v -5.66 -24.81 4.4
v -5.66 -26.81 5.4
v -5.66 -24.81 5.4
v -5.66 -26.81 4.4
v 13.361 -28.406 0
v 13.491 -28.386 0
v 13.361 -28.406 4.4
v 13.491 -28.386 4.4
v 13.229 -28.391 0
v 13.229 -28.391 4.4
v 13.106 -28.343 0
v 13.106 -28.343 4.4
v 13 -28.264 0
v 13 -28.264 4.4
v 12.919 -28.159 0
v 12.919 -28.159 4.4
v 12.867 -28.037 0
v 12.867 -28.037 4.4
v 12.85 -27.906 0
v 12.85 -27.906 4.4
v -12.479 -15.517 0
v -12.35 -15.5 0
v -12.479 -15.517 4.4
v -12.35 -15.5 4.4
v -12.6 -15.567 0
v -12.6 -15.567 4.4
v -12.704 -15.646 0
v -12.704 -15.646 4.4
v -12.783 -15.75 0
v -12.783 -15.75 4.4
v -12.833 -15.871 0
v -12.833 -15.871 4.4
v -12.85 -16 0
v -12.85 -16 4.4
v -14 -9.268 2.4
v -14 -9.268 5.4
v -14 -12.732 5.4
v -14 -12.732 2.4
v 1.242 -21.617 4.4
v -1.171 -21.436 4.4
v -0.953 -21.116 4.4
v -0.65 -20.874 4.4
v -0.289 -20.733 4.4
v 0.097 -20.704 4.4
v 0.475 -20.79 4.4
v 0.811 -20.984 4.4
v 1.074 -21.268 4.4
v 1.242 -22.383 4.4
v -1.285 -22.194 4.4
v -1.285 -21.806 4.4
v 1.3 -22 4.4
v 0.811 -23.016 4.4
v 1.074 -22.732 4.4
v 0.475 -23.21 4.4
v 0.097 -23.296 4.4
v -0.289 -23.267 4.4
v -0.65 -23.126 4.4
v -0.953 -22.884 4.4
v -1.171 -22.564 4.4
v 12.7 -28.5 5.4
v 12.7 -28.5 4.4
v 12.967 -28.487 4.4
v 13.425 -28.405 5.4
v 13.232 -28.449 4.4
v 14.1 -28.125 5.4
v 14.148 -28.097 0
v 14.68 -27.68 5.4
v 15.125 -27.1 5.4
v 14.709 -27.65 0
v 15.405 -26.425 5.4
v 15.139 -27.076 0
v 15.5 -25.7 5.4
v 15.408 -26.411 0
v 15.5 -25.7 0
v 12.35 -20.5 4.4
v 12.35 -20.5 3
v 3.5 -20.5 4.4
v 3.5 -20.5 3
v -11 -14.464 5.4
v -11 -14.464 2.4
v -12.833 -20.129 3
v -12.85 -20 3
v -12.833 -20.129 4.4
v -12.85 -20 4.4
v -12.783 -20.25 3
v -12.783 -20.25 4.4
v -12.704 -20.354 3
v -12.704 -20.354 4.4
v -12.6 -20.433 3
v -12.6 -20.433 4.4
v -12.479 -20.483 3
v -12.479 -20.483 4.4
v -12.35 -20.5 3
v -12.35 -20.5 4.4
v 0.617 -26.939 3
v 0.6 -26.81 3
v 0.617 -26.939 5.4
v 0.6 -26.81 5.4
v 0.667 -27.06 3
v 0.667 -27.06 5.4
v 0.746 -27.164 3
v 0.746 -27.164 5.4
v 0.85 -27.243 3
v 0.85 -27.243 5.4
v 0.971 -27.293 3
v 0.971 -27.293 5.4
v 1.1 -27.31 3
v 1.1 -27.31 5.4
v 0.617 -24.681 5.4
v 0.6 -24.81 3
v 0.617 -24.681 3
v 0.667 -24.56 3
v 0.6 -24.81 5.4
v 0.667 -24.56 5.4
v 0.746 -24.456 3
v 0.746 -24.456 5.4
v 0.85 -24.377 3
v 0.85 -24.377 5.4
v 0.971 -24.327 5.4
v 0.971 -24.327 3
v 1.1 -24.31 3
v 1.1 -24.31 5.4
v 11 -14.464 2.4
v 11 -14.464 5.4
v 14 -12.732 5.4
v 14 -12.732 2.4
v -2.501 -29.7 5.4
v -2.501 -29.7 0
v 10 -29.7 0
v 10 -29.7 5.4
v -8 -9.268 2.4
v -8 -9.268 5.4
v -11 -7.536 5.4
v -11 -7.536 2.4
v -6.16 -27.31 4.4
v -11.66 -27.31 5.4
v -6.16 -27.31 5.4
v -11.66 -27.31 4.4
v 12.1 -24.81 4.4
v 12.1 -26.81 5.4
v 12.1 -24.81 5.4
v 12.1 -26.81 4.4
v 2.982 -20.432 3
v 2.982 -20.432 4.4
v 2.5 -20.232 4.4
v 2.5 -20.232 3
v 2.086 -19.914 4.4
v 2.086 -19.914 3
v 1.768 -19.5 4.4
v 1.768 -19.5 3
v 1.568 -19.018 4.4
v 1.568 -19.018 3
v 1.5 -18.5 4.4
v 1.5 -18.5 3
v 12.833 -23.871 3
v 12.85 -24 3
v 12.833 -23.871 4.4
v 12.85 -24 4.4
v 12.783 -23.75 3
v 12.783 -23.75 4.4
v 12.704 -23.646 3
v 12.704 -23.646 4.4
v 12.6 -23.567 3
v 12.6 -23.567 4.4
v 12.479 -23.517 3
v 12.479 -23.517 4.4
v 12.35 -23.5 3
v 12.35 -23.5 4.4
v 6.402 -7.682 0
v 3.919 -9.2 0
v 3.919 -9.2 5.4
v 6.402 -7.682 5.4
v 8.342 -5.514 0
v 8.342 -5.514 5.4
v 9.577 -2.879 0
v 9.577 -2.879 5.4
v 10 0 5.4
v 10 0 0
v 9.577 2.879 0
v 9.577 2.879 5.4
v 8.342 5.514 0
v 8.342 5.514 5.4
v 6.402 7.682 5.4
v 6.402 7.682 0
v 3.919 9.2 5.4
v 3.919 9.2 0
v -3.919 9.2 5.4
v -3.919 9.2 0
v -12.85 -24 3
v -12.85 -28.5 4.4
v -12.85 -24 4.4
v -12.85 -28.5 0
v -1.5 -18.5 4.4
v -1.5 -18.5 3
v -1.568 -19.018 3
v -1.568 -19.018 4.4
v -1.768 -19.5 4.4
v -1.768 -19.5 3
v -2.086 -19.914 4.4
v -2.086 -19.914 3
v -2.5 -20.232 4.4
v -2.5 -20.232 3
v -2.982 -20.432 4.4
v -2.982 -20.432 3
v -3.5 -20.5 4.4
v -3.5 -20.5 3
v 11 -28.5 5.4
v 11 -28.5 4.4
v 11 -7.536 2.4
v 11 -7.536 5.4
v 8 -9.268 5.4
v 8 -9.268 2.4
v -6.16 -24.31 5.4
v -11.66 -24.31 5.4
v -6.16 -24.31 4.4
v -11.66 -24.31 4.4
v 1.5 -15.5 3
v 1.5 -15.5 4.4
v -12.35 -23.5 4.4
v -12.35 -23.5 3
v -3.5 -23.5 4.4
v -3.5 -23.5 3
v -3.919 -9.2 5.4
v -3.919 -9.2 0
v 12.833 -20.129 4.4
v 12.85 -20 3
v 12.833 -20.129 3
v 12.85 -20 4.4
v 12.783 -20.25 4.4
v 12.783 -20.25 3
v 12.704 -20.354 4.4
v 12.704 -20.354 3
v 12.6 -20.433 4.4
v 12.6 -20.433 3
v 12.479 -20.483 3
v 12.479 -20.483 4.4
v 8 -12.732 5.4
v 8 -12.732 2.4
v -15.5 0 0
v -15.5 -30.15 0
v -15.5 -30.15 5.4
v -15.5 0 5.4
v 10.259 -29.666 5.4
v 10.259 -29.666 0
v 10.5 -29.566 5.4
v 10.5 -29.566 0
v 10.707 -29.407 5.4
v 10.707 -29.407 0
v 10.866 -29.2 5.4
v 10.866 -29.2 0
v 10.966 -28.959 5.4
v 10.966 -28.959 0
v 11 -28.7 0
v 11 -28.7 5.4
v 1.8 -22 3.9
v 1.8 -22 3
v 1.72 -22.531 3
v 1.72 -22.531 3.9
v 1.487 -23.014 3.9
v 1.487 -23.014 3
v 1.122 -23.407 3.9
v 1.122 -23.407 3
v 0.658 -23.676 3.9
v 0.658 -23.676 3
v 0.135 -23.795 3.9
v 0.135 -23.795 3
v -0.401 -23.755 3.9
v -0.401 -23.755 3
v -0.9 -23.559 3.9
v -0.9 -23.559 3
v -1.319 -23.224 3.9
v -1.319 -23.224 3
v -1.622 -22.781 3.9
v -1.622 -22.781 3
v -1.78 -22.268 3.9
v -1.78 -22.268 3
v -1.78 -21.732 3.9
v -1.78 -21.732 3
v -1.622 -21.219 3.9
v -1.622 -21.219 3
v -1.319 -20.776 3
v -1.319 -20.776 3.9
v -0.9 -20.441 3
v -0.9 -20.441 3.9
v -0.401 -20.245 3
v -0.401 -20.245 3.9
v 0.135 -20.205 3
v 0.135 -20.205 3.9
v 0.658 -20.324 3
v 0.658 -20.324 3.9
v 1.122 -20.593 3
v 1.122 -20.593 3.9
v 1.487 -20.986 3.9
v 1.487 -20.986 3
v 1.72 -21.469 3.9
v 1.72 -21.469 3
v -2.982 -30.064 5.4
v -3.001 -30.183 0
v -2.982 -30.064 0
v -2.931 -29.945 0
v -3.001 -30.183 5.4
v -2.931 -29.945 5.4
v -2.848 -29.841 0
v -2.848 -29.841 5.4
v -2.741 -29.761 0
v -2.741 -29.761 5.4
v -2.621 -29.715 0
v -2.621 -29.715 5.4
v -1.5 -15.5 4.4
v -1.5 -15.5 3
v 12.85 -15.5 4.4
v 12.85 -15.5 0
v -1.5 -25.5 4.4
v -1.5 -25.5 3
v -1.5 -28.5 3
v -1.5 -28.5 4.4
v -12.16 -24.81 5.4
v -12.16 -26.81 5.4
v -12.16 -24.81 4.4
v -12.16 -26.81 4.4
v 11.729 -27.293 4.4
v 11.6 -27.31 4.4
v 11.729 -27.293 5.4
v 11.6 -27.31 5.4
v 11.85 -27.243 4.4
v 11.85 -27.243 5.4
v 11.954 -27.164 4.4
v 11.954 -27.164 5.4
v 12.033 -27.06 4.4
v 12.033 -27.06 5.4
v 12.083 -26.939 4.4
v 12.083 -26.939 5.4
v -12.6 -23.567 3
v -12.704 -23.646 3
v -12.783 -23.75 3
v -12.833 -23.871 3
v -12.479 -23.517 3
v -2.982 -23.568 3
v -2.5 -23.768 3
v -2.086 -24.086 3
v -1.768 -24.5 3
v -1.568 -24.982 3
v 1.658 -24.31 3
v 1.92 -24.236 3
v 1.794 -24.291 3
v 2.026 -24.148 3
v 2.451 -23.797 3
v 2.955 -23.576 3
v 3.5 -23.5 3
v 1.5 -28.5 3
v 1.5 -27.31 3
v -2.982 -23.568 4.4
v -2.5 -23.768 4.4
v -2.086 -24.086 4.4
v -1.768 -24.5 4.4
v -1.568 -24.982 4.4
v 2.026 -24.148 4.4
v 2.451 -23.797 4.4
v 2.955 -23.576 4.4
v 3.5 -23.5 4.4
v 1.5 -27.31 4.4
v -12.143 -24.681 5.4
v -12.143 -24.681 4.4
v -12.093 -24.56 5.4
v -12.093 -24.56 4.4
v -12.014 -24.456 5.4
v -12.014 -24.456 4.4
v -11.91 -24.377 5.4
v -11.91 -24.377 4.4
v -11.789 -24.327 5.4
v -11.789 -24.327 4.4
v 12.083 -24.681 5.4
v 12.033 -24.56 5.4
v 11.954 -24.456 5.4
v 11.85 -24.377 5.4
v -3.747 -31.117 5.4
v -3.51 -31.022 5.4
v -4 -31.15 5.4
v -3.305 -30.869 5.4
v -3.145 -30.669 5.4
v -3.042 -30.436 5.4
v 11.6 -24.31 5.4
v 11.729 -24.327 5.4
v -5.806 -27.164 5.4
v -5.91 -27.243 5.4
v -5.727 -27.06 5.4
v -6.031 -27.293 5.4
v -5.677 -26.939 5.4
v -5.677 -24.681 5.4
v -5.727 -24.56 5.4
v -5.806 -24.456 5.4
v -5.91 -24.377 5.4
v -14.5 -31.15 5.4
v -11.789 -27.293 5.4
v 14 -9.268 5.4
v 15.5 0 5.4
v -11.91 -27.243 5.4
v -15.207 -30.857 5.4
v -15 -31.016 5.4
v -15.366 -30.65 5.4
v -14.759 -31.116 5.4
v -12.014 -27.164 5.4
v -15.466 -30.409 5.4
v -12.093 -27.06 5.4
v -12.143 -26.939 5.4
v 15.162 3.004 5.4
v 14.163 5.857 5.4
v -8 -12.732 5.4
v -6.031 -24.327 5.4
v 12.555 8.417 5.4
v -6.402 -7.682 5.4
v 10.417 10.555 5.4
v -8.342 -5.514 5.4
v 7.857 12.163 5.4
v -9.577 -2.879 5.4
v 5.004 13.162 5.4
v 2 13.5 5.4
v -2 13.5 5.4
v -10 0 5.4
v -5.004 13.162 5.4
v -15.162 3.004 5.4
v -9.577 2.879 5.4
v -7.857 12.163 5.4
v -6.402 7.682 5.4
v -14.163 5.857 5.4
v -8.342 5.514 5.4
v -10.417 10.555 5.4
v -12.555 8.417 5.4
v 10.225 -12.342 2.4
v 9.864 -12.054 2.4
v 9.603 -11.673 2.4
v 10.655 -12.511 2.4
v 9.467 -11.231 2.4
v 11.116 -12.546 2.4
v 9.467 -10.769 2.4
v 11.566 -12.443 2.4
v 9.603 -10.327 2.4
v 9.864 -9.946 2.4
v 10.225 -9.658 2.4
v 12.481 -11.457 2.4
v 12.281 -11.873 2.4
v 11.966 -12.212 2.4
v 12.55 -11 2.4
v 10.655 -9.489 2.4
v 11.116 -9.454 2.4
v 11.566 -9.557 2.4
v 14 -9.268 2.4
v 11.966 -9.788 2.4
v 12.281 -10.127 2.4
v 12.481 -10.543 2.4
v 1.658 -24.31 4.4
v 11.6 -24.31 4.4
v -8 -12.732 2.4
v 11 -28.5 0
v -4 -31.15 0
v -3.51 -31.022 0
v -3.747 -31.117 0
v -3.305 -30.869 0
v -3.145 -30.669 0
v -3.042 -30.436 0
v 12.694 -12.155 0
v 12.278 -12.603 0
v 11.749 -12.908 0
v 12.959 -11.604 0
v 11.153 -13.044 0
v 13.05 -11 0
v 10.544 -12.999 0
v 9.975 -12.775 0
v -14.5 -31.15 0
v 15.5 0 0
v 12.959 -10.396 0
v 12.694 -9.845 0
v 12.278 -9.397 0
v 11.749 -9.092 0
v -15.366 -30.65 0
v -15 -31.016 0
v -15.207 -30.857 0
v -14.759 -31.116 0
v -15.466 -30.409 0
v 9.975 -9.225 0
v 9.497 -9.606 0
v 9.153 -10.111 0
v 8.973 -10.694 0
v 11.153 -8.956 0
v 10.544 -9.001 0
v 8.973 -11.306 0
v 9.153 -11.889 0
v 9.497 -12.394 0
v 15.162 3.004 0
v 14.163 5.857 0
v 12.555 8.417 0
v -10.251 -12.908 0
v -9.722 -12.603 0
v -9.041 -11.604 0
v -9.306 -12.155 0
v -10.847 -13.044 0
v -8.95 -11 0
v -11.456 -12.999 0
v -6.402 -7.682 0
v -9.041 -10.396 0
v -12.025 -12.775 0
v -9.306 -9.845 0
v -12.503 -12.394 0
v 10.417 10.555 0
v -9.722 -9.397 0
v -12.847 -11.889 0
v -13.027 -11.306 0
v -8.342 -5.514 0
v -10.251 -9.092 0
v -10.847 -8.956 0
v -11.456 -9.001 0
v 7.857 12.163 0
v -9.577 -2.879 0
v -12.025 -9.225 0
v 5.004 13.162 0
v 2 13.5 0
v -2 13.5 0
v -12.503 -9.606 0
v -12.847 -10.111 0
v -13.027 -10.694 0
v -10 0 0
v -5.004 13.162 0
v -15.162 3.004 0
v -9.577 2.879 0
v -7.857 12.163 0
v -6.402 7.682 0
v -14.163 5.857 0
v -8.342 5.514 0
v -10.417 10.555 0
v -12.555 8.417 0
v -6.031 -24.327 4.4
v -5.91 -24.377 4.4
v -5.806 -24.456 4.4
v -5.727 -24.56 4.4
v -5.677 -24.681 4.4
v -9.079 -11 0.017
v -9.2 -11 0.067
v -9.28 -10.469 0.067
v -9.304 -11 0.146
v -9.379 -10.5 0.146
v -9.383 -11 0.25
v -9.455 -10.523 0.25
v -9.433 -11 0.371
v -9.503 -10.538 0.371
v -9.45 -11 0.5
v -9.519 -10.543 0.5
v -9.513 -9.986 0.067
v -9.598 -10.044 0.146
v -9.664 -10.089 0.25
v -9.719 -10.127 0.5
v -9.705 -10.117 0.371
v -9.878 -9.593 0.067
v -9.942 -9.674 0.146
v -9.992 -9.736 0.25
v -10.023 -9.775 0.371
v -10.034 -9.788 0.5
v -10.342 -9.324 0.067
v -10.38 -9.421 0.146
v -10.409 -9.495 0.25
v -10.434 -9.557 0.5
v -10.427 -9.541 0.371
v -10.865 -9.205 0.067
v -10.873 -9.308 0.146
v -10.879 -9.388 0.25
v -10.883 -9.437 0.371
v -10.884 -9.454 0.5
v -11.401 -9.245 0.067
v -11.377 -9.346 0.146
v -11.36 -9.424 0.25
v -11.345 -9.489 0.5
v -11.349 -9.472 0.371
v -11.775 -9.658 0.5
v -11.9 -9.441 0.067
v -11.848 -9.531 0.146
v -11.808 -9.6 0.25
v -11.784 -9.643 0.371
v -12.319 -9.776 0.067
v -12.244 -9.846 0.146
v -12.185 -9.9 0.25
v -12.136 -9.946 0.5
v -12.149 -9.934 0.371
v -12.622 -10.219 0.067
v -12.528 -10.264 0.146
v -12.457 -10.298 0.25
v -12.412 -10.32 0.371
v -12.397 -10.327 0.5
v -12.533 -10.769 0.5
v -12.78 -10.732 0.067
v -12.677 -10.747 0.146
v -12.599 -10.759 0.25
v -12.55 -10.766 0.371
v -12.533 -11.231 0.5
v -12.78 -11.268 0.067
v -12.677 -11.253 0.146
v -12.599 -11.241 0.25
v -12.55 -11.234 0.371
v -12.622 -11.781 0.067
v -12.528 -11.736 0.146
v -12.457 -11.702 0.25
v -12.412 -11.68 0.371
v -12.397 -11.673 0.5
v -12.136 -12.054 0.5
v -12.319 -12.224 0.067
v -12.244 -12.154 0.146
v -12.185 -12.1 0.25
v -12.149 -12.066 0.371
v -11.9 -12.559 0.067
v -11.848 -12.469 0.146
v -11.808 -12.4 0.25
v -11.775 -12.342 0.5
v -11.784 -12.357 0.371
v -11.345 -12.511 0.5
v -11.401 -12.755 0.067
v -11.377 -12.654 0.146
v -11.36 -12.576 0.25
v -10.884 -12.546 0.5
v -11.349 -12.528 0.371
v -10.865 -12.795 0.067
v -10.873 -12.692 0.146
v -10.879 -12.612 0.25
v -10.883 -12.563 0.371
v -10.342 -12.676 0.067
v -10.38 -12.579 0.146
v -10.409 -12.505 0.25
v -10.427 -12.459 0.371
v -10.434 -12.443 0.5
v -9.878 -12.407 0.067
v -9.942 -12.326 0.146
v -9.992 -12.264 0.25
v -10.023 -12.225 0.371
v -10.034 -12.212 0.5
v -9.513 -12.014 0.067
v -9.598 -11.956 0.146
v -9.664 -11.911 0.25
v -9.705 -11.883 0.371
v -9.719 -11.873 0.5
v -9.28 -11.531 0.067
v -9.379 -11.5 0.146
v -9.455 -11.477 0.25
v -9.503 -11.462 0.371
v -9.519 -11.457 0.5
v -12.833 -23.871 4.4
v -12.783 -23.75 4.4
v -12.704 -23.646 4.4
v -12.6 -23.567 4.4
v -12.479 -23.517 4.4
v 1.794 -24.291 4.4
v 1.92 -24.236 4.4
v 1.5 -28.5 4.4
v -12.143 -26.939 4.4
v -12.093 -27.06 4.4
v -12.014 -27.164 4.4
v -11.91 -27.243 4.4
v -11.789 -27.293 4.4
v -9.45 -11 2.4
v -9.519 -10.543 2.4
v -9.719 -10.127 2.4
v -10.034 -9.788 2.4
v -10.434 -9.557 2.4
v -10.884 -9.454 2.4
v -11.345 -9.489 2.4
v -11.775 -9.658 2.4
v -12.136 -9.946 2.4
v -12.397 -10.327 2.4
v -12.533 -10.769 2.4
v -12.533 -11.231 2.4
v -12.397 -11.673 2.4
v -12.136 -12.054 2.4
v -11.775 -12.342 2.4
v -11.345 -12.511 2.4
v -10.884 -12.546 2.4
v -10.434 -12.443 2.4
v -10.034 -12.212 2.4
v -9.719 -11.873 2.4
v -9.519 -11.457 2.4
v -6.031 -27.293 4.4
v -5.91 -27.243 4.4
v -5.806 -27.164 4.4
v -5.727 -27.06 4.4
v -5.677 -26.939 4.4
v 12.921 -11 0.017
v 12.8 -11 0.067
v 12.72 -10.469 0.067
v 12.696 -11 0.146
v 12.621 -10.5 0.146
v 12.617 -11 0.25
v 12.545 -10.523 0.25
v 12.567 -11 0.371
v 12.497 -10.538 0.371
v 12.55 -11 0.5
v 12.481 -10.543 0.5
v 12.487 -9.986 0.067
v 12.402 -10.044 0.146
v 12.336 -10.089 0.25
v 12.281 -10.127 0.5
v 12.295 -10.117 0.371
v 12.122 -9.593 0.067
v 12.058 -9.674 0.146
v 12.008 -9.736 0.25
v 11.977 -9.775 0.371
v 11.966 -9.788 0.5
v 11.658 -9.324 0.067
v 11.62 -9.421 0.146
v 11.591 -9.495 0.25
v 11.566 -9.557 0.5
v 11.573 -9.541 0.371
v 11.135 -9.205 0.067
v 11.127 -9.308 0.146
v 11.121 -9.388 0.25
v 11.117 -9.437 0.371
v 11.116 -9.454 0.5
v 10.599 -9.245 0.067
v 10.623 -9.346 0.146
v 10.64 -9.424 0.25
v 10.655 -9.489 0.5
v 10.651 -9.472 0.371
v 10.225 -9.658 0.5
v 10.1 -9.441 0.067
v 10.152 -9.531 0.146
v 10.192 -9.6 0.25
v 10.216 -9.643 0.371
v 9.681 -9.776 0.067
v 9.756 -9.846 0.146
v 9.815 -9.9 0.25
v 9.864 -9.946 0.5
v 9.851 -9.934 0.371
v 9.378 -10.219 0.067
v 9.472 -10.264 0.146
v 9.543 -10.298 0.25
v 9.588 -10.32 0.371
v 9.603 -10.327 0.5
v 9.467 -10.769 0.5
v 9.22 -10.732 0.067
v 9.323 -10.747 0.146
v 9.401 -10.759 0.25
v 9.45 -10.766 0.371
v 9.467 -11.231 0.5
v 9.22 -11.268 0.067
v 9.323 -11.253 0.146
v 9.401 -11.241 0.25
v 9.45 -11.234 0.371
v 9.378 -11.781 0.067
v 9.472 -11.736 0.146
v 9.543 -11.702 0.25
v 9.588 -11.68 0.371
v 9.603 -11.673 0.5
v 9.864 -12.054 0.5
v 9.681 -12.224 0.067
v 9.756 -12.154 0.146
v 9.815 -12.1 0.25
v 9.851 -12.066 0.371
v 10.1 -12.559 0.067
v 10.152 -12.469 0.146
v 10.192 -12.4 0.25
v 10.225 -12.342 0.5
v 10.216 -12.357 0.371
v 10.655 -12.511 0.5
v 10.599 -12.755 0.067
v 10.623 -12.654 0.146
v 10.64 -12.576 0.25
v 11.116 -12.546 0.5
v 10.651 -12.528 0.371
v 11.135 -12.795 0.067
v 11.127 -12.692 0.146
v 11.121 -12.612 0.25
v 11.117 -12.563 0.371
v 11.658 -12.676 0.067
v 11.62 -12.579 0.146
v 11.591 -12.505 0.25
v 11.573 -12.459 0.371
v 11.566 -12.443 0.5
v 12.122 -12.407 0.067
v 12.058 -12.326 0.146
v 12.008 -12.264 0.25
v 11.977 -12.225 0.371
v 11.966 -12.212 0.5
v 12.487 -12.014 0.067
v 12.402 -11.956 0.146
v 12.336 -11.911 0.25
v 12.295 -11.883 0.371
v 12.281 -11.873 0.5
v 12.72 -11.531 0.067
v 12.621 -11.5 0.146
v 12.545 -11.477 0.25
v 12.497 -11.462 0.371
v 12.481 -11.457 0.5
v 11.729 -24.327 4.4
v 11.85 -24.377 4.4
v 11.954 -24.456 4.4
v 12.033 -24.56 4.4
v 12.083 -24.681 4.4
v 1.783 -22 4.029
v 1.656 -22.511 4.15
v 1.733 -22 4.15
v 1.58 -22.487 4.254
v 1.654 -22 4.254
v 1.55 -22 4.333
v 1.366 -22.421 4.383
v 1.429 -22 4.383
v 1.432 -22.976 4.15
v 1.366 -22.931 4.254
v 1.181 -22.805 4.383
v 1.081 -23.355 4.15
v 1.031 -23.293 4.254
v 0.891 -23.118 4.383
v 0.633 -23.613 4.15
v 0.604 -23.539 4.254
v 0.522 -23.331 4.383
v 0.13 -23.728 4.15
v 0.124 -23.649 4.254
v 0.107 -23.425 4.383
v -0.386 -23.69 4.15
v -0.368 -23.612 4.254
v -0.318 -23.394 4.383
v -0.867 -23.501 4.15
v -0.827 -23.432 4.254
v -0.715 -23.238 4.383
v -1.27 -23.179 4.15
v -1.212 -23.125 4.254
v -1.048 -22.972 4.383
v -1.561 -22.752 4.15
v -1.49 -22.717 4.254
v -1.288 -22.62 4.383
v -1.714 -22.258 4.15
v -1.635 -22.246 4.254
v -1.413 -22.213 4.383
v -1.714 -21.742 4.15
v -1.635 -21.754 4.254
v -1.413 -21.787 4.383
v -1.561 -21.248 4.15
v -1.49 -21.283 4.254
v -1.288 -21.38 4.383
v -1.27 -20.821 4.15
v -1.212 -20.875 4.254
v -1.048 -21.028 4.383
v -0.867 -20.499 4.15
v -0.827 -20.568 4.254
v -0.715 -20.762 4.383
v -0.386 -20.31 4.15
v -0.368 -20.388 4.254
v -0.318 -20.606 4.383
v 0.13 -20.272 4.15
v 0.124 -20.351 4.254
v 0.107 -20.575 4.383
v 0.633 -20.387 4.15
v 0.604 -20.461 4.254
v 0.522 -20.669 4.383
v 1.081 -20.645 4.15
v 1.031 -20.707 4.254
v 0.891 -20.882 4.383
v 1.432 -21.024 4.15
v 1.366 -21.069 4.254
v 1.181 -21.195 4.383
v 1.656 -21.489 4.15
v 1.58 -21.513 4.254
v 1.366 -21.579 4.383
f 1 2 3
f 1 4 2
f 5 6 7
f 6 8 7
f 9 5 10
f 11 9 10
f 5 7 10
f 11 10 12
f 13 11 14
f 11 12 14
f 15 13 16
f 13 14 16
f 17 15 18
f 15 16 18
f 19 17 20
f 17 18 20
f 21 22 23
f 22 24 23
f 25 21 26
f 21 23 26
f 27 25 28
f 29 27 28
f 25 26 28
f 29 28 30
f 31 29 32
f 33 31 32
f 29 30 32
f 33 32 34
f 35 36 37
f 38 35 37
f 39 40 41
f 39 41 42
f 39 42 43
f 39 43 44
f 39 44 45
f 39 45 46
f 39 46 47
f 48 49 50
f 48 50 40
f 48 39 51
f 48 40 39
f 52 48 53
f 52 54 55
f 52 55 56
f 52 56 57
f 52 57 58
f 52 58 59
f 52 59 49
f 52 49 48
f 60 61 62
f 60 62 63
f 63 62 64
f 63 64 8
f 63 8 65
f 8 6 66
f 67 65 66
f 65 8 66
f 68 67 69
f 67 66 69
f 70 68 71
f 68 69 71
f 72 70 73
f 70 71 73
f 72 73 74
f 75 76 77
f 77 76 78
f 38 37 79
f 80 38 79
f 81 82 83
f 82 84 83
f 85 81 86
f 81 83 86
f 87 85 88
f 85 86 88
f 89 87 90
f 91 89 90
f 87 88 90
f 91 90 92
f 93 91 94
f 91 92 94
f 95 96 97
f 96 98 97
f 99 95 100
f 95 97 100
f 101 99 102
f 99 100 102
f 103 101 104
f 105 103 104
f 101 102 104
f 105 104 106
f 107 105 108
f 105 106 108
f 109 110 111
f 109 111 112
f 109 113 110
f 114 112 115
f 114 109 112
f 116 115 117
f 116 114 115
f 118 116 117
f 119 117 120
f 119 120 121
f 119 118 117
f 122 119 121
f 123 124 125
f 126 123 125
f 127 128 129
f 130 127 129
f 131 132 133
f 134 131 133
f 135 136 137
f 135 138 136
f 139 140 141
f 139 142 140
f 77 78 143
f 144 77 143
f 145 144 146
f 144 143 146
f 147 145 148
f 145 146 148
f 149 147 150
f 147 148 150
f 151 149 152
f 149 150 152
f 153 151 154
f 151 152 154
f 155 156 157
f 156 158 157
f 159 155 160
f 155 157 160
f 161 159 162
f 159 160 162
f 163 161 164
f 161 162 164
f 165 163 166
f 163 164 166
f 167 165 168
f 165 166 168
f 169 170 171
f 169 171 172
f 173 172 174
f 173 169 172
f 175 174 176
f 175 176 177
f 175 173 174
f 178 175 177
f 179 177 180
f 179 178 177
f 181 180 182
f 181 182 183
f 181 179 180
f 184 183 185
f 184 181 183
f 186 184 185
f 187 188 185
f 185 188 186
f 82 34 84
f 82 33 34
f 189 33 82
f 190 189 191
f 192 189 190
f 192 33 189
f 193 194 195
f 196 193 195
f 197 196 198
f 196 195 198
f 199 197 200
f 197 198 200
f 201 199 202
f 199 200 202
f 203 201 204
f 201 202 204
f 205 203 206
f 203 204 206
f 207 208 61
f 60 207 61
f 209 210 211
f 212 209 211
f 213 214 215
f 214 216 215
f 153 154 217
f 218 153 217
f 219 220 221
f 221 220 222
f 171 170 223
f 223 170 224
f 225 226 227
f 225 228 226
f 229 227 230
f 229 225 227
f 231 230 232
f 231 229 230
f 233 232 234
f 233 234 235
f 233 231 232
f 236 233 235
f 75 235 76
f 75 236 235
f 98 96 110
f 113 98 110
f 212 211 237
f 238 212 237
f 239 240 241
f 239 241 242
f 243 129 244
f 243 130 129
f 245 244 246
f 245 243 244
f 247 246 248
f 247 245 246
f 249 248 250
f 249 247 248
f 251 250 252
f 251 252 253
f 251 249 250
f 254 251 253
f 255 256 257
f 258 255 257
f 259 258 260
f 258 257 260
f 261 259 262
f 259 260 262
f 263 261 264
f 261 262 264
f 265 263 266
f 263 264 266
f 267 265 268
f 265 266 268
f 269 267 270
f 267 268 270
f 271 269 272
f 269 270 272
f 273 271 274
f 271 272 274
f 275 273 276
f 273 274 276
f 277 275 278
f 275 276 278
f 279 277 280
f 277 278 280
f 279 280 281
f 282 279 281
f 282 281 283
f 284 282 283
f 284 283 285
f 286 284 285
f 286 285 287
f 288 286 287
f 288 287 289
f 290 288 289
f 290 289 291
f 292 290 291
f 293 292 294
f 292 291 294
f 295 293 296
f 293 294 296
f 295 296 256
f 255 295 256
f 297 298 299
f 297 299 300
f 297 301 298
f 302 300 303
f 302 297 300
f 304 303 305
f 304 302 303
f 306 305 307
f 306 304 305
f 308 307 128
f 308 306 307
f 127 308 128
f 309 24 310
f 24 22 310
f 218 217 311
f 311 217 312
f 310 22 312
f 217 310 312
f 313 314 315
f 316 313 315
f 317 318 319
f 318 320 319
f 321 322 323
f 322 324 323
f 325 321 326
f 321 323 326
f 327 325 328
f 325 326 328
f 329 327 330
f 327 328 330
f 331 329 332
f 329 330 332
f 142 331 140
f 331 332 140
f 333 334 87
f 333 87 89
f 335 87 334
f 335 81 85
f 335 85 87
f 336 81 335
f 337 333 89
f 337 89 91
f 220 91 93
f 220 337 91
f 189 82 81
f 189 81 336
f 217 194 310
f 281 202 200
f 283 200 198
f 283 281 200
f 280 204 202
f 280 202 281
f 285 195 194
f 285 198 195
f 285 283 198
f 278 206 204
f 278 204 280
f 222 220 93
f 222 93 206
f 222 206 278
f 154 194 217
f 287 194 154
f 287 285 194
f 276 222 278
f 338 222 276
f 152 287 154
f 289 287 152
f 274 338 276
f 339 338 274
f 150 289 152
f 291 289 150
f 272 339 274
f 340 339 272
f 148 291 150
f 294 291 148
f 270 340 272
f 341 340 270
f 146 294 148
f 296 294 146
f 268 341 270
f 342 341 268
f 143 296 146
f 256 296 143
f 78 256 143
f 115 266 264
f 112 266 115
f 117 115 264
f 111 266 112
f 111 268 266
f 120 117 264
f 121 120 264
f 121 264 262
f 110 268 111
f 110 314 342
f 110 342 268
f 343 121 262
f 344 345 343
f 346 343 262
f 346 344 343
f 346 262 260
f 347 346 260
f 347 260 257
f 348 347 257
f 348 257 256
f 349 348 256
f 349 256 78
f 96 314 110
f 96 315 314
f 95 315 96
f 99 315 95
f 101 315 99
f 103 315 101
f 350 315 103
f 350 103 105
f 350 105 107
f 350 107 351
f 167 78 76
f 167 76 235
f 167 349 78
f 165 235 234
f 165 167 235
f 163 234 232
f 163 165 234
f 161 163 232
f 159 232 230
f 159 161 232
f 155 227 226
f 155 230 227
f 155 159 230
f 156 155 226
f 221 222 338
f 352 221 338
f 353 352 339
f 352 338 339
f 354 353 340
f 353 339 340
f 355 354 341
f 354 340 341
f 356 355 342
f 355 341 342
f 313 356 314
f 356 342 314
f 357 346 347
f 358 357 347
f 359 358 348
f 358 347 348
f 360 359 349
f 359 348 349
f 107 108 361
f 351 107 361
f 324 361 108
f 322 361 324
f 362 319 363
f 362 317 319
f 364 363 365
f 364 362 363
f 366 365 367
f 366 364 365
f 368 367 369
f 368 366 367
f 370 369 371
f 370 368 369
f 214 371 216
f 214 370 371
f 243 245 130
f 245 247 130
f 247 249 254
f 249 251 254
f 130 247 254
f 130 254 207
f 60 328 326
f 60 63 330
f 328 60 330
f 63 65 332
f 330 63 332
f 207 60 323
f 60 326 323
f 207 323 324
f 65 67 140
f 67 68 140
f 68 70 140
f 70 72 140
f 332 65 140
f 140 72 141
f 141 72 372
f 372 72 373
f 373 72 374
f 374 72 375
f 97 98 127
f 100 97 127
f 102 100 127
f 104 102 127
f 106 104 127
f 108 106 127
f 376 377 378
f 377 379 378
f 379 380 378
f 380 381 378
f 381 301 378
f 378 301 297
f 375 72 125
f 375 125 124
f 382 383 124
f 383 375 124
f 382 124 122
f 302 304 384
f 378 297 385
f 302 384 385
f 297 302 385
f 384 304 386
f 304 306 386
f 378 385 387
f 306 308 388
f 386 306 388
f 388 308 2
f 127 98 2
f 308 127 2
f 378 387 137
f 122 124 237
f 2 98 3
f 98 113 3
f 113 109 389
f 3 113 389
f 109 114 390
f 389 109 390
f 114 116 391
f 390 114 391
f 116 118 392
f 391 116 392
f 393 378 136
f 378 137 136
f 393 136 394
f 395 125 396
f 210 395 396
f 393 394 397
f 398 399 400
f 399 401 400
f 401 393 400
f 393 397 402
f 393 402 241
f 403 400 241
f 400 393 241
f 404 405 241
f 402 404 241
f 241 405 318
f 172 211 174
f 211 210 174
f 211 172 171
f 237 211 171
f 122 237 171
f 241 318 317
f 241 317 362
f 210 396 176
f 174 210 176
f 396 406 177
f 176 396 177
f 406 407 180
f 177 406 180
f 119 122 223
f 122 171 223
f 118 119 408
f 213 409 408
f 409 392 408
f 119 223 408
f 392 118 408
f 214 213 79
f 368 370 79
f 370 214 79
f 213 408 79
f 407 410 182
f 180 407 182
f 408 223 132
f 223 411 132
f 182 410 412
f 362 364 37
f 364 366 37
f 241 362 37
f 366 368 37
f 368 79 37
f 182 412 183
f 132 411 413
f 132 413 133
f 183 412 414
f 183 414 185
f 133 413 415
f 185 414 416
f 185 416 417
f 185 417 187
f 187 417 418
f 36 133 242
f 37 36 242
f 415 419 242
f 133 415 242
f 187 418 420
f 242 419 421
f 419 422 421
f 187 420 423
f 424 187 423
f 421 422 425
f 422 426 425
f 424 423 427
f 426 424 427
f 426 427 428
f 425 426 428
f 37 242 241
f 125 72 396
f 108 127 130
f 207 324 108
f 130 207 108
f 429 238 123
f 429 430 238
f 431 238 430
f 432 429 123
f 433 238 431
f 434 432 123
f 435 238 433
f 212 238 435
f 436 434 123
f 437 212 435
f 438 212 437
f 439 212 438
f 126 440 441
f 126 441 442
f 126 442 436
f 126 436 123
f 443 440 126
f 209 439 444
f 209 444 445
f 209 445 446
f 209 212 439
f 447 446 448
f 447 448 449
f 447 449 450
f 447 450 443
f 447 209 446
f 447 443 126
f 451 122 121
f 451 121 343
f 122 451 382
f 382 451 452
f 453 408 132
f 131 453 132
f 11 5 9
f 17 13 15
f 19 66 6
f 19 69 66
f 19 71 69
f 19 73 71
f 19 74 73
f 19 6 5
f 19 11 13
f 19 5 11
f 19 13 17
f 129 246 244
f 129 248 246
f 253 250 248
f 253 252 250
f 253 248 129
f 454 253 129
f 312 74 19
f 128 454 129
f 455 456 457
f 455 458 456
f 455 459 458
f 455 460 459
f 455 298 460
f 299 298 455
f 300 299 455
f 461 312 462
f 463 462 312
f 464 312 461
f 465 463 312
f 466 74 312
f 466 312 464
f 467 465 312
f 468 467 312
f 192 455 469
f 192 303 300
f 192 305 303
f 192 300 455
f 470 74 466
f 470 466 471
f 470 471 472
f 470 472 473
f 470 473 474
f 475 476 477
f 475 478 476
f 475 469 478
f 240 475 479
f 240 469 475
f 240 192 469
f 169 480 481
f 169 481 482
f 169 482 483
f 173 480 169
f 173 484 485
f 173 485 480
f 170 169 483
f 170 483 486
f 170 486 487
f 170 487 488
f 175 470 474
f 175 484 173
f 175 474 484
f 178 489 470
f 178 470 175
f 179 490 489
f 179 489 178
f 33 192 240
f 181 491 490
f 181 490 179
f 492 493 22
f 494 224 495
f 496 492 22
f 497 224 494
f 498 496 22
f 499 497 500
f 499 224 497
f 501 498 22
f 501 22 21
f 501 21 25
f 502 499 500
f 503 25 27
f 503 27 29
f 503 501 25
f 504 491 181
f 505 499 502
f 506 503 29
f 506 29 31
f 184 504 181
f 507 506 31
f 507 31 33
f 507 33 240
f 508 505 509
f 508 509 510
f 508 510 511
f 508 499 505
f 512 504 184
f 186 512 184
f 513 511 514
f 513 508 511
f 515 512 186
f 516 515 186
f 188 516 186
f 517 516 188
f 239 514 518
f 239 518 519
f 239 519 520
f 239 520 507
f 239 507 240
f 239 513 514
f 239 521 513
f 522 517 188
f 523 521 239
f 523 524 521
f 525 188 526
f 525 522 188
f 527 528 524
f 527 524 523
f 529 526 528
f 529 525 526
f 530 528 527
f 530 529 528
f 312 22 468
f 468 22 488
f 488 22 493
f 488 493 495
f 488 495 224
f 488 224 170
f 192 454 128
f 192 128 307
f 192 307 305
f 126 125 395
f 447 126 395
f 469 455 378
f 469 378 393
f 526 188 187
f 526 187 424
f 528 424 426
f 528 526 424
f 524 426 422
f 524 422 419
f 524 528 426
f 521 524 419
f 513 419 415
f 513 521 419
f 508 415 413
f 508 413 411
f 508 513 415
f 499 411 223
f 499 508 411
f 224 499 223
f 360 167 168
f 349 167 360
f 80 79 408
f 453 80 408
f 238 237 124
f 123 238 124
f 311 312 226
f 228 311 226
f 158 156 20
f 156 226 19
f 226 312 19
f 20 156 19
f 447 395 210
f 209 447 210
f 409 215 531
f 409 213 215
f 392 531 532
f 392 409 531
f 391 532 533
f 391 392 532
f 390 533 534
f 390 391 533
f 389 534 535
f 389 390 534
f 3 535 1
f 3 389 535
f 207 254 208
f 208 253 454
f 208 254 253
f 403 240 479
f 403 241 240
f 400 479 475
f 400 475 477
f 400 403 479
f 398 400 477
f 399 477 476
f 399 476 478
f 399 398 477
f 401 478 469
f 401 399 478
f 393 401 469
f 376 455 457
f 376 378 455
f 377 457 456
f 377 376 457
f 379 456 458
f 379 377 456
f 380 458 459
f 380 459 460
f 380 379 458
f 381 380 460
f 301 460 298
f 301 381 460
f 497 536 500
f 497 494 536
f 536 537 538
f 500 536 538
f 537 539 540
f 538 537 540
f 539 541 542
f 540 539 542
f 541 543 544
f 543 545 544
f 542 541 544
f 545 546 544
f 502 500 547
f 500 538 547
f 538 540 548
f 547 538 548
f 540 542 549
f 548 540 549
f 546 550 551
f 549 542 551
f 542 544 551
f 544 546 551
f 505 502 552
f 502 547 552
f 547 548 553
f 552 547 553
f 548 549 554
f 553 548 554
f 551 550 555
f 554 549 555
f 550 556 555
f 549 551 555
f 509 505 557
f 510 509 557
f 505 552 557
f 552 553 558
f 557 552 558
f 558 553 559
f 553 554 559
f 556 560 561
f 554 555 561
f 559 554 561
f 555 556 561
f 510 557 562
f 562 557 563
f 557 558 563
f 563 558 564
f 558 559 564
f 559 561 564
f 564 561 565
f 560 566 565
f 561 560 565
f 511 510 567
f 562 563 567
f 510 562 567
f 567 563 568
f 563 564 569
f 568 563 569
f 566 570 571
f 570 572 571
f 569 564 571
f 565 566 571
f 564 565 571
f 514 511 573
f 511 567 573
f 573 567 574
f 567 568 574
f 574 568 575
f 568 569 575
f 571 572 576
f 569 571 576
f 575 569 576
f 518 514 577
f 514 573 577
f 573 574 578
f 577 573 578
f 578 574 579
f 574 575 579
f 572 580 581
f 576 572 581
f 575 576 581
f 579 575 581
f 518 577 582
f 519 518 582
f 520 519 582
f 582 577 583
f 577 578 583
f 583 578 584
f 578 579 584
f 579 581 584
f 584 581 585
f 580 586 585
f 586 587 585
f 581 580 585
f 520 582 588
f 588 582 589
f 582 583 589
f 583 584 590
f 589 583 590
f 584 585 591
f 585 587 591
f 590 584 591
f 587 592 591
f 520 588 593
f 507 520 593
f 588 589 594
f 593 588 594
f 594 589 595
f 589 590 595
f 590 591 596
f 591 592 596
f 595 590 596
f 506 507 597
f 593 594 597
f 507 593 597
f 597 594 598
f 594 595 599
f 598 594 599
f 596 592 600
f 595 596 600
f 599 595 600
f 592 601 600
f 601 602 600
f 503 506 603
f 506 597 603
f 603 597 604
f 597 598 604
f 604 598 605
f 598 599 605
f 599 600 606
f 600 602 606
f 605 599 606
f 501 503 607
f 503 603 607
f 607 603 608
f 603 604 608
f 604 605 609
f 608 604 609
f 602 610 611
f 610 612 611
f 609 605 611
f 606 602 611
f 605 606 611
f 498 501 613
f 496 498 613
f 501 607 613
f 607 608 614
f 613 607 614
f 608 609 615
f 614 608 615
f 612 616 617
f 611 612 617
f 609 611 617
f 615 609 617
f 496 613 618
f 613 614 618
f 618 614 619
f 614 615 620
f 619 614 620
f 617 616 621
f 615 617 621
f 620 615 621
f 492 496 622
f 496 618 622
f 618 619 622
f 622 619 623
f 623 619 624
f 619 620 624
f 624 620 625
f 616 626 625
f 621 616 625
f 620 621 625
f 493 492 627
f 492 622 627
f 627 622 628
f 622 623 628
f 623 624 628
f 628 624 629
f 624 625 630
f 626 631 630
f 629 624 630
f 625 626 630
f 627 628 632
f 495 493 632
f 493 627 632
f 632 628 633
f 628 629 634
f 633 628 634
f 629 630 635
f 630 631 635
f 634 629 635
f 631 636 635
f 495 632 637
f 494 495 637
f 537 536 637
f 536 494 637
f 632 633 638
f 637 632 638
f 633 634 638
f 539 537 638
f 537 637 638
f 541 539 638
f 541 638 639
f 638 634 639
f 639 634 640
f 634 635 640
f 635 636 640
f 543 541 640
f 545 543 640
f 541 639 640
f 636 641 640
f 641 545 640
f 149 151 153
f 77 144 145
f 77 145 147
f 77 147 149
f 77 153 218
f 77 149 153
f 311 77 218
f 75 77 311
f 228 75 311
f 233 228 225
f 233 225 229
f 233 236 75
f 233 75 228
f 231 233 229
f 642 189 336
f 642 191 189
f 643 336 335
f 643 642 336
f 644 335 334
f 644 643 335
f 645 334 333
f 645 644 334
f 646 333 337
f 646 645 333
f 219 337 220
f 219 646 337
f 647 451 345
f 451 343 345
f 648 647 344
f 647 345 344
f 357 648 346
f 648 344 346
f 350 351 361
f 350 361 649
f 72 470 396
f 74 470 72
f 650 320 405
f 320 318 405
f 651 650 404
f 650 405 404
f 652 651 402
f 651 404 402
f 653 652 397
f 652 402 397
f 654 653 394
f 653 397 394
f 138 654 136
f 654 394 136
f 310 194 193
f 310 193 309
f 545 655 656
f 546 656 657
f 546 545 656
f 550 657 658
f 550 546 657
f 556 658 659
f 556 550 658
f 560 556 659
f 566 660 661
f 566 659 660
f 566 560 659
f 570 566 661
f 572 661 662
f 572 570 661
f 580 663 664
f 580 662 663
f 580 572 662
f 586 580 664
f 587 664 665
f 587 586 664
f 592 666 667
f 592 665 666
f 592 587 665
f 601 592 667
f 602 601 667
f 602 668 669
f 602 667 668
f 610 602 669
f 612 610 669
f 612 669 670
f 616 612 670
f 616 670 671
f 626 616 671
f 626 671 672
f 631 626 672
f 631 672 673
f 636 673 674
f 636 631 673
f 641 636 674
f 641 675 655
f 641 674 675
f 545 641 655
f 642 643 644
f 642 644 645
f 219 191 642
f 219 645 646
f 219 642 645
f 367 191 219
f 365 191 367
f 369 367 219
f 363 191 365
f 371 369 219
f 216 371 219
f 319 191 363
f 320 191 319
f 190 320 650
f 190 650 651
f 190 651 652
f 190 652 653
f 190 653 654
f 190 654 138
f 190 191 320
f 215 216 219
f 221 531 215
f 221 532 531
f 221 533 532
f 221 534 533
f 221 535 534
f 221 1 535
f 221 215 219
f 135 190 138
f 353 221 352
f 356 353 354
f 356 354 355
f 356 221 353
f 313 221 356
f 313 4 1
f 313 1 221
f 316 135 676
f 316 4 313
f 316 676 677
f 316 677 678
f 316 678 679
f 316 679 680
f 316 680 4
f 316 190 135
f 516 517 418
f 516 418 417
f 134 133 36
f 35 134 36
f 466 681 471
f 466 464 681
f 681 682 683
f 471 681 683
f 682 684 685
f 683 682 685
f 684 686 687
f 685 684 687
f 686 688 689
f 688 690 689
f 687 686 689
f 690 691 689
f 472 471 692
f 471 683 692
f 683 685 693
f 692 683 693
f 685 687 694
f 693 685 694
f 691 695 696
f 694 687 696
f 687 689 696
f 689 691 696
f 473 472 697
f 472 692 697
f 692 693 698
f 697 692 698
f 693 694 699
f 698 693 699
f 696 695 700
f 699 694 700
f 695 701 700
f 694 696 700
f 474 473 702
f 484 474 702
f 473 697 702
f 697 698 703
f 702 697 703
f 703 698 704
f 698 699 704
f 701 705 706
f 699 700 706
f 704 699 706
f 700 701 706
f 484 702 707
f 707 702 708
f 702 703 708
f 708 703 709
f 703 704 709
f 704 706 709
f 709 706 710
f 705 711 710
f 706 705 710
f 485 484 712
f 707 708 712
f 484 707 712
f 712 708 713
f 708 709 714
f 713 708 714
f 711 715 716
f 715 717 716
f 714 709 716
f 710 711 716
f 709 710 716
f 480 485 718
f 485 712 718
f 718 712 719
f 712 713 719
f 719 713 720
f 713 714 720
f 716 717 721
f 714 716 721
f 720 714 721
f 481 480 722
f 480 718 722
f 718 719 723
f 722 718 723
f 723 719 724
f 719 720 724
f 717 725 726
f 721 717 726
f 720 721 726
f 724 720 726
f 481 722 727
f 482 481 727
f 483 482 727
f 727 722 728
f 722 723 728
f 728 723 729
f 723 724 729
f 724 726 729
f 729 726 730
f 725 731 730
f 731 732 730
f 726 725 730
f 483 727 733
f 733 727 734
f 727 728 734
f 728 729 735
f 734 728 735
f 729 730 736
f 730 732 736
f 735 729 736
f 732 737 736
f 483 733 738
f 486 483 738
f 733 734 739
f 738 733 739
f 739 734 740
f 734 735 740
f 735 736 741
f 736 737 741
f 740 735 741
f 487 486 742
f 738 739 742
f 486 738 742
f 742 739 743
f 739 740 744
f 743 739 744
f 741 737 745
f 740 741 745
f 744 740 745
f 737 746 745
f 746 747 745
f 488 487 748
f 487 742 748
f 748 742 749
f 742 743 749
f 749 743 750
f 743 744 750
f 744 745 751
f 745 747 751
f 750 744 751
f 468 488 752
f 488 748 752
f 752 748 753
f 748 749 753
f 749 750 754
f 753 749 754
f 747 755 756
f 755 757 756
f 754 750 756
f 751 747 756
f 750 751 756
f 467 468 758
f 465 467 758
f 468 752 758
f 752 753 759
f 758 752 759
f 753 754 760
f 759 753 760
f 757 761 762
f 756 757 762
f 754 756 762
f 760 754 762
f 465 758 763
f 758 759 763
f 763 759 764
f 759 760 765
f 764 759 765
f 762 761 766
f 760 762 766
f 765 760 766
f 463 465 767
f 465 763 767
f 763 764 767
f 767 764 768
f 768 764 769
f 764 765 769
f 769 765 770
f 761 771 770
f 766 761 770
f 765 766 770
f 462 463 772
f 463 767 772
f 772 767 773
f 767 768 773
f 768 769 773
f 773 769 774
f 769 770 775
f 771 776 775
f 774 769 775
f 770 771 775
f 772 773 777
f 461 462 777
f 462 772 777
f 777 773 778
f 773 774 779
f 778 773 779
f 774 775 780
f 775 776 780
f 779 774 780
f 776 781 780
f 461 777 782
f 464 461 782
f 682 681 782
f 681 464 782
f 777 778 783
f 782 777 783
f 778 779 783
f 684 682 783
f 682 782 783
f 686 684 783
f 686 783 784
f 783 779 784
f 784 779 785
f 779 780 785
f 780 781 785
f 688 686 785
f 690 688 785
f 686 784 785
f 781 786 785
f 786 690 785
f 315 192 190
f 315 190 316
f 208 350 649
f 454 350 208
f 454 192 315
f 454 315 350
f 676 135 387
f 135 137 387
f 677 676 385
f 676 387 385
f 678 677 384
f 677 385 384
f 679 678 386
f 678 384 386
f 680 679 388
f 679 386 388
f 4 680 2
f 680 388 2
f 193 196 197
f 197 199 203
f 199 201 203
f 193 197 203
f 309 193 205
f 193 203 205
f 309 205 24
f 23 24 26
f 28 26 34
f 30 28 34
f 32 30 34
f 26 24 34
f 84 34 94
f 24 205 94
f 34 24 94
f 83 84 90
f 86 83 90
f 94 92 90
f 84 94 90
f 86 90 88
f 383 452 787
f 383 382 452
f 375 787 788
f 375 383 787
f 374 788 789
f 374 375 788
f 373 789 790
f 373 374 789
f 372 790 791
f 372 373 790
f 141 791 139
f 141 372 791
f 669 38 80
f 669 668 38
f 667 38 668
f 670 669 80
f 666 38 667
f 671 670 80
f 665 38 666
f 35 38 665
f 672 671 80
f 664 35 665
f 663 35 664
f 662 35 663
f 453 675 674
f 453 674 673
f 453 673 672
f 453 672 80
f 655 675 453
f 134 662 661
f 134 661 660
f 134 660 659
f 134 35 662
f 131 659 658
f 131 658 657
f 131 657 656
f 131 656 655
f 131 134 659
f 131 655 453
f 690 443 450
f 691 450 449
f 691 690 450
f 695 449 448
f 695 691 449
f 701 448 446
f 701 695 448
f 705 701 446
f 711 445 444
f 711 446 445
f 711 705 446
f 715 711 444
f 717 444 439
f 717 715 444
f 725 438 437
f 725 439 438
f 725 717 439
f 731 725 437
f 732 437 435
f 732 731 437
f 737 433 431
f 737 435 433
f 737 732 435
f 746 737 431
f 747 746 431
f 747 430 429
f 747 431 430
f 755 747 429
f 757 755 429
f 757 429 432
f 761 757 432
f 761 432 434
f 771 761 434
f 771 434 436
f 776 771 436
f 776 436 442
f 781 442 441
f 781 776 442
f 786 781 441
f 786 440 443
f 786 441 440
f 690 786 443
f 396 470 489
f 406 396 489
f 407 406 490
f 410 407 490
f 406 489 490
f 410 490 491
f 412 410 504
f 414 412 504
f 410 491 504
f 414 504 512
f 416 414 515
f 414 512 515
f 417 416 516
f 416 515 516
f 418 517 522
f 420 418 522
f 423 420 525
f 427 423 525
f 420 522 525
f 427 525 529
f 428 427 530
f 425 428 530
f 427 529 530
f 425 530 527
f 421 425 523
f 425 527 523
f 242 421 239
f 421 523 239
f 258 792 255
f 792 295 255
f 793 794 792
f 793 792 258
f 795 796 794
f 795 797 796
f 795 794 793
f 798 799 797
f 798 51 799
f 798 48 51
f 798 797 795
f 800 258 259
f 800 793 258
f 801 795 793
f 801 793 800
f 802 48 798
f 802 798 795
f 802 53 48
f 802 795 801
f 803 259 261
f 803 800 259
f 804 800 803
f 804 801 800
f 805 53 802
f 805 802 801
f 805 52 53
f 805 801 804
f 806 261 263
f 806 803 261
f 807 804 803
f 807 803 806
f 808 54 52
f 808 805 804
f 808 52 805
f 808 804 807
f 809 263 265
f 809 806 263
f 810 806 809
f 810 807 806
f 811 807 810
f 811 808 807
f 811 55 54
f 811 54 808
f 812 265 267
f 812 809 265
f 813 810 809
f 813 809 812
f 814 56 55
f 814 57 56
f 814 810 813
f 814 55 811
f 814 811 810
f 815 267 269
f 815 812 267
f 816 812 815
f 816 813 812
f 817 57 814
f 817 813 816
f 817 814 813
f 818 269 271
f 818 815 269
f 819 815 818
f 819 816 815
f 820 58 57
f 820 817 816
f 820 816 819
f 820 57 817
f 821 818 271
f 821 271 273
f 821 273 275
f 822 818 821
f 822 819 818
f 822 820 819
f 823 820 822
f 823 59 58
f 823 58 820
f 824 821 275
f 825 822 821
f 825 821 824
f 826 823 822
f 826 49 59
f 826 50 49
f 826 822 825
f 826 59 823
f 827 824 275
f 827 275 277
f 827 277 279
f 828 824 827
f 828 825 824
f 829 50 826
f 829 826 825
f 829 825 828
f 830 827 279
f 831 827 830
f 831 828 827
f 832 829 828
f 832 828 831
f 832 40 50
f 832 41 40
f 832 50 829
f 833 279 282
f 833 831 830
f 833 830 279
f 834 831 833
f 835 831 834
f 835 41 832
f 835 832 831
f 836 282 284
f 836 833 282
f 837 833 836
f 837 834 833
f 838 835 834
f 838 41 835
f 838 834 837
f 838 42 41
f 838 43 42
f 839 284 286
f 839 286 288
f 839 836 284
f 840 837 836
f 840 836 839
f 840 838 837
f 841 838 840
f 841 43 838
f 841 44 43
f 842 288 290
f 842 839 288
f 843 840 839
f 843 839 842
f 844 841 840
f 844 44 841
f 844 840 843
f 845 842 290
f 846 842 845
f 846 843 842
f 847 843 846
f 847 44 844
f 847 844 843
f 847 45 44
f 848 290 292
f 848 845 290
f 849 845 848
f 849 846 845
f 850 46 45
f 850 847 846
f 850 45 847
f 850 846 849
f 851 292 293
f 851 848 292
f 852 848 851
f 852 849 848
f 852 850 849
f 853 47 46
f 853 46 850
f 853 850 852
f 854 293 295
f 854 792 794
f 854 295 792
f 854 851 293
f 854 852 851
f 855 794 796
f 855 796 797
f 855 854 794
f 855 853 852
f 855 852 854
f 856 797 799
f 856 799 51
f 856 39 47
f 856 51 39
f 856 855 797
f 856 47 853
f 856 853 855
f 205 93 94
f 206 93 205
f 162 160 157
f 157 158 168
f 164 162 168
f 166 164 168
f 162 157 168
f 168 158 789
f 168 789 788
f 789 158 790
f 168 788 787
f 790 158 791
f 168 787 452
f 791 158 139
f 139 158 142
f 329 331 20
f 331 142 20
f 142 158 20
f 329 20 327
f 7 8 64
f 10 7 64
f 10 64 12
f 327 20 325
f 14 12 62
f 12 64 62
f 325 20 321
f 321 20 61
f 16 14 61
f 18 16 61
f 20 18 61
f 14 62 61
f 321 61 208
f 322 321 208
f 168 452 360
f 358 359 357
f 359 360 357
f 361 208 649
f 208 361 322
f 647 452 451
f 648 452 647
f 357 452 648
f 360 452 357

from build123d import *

# Parameters (mm, degrees)
SKETCH_R        = 1.55
SKETCH_W        = 6.5
SKETCH_H        = 3
SKETCH_W_2      = 11.5
PAD_DEPTH       = 5.4
SKETCH005_W     = 25.7
SKETCH005_H     = 13
POCKET_DEPTH    = 3
SKETCH006_R     = 1.8
POCKET001_DEPTH = 1.4
POCKET002_DEPTH = 3
FILLET_R        = 1
FILLET001_R     = 0.5


with BuildPart() as part:
    # Sketch → Pad (new body)
    with BuildSketch(Plane.XY):
        with BuildLine():
            Line((-2, 13.5), (2, 13.5))
            ThreePointArc((15.5, 0), (11.545942, 9.545942), (2, 13.5))
            Line((15.5, 0), (15.5, -25.7))
            ThreePointArc((12.7, -28.5), (14.679899, -27.679899), (15.5, -25.7))
            Line((11, -28.5), (12.7, -28.5))
            Line((11, -29.7), (11, -28.5))
            Line((-3, -29.7), (11, -29.7))
            Line((-3, -31.15), (-3, -29.7))
            Line((-3, -31.15), (-15.5, -31.15))
            Line((-15.5, -31.15), (-15.5, 0))
            ThreePointArc((-2, 13.5), (-11.545942, 9.545942), (-15.5, 0))
        make_face()
        with Locations((-11, -11)):
            Circle(SKETCH_R, mode=Mode.SUBTRACT)
        with Locations((11, -11)):
            Circle(SKETCH_R, mode=Mode.SUBTRACT)
        with BuildLine():
            ThreePointArc((-3.919184, 9.2), (-10, 0), (-3.919184, -9.2))
            Line((3.919184, -9.2), (-3.919184, -9.2))
            ThreePointArc((3.919184, -9.2), (10, 0), (3.919184, 9.2))
            Line((-3.919184, 9.2), (3.919184, 9.2))
        make_face(mode=Mode.SUBTRACT)
        with Locations((-8.91, -25.81)):
            Rectangle(SKETCH_W, SKETCH_H, mode=Mode.SUBTRACT)
        with Locations((6.35, -25.81)):
            Rectangle(SKETCH_W_2, SKETCH_H, mode=Mode.SUBTRACT)
    extrude(amount=PAD_DEPTH)

    # Sketch005 (on Face26 of Pad) → Pocket (cut)
    with BuildSketch(Plane(origin=(0, 0, 0), x_dir=(1, 0, 0), z_dir=(0, 0, -1))):
        with Locations((0, 22)):
            Rectangle(SKETCH005_W, SKETCH005_H)
    extrude(amount=-POCKET_DEPTH, mode=Mode.SUBTRACT)

    # Sketch006 (on Face32 of Pocket) → Pocket001 (cut)
    with BuildSketch(Plane(origin=(0, 0, 3), x_dir=(1, 0, 0), z_dir=(0, 0, -1))):
        with Locations((0, 22)):
            Circle(SKETCH006_R)
        with BuildLine():
            Line((-12.85, 20.5), (-3.5, 20.5))
            ThreePointArc((-1.5, 18.5), (-2.085786, 19.914214), (-3.5, 20.5))
            Line((-1.5, 18.5), (-1.5, 15.5))
            Line((-1.5, 15.5), (-12.85, 15.5))
            Line((-12.85, 15.5), (-12.85, 20.5))
        make_face()
        with BuildLine():
            Line((1.5, 15.5), (12.85, 15.5))
            Line((12.85, 15.5), (12.85, 20.5))
            Line((12.85, 20.5), (3.5, 20.5))
            ThreePointArc((3.5, 20.5), (2.085786, 19.914214), (1.5, 18.5))
            Line((1.5, 18.5), (1.5, 15.5))
        make_face()
        with BuildLine():
            Line((-12.85, 23.5), (-3.5, 23.5))
            ThreePointArc((-3.5, 23.5), (-2.085786, 24.085786), (-1.5, 25.5))
            Line((-1.5, 25.5), (-1.5, 28.5))
            Line((-1.5, 28.5), (-12.85, 28.5))
            Line((-12.85, 28.5), (-12.85, 23.5))
        make_face()
        with BuildLine():
            Line((1.5, 28.5), (12.85, 28.5))
            Line((12.85, 28.5), (12.85, 23.5))
            Line((12.85, 23.5), (3.5, 23.5))
            ThreePointArc((1.5, 25.5), (2.085786, 24.085786), (3.5, 23.5))
            Line((1.5, 25.5), (1.5, 28.5))
        make_face()
    extrude(amount=-POCKET001_DEPTH, mode=Mode.SUBTRACT)

    # Sketch001 (on Face5 of Pocket001) → Pocket002 (cut)
    with BuildSketch(Plane.XY.offset(5.4)):
        Polygon((-8, -12.732051), (-8, -9.267949), (-11, -7.535898), (-14, -9.267949), (-14, -12.732051), (-11, -14.464102), align=None)
        Polygon((14, -12.732051), (14, -9.267949), (11, -7.535898), (8, -9.267949), (8, -12.732051), (11, -14.464102), align=None)
    extrude(amount=-POCKET002_DEPTH, mode=Mode.SUBTRACT)

    # Fillet
    fillet_edges = [part.edges().sort_by_distance(p)[0] for p in [
        (-15.5, -31.15, 2.7),
        (-3, -31.15, 2.7),
        (11, -29.7, 2.7),
    ]]
    fillet(fillet_edges, radius=FILLET_R)

    # Fillet001
    fillet001_edges = [part.edges().sort_by_distance(p)[0] for p in [
        (12.85, -23.5, 3.7),
        (12.85, -20.5, 3.7),
        (-12.85, -20.5, 3.7),
        (-12.85, -23.5, 3.7),
        (-1.8, -22, 4.4),
        (0.6, -27.31, 4.2),
        (0.6, -24.31, 4.2),
        (1.892549, -24.31, 3.7),
        (-3, -29.7, 2.7),
        (12.1, -27.31, 4.9),
        (12.1, -24.31, 4.9),
        (-5.66, -27.31, 4.9),
        (-5.66, -24.31, 4.9),
        (-12.16, -24.31, 4.9),
        (-12.16, -27.31, 4.9),
        (-12.85, -15.5, 1.5),
        (12.85, -28.495979, 1.5),
        (9.45, -11, 0),
        (-12.55, -11, 0),
    ]]
    fillet(fillet001_edges, radius=FILLET001_R)


solid = part.part
